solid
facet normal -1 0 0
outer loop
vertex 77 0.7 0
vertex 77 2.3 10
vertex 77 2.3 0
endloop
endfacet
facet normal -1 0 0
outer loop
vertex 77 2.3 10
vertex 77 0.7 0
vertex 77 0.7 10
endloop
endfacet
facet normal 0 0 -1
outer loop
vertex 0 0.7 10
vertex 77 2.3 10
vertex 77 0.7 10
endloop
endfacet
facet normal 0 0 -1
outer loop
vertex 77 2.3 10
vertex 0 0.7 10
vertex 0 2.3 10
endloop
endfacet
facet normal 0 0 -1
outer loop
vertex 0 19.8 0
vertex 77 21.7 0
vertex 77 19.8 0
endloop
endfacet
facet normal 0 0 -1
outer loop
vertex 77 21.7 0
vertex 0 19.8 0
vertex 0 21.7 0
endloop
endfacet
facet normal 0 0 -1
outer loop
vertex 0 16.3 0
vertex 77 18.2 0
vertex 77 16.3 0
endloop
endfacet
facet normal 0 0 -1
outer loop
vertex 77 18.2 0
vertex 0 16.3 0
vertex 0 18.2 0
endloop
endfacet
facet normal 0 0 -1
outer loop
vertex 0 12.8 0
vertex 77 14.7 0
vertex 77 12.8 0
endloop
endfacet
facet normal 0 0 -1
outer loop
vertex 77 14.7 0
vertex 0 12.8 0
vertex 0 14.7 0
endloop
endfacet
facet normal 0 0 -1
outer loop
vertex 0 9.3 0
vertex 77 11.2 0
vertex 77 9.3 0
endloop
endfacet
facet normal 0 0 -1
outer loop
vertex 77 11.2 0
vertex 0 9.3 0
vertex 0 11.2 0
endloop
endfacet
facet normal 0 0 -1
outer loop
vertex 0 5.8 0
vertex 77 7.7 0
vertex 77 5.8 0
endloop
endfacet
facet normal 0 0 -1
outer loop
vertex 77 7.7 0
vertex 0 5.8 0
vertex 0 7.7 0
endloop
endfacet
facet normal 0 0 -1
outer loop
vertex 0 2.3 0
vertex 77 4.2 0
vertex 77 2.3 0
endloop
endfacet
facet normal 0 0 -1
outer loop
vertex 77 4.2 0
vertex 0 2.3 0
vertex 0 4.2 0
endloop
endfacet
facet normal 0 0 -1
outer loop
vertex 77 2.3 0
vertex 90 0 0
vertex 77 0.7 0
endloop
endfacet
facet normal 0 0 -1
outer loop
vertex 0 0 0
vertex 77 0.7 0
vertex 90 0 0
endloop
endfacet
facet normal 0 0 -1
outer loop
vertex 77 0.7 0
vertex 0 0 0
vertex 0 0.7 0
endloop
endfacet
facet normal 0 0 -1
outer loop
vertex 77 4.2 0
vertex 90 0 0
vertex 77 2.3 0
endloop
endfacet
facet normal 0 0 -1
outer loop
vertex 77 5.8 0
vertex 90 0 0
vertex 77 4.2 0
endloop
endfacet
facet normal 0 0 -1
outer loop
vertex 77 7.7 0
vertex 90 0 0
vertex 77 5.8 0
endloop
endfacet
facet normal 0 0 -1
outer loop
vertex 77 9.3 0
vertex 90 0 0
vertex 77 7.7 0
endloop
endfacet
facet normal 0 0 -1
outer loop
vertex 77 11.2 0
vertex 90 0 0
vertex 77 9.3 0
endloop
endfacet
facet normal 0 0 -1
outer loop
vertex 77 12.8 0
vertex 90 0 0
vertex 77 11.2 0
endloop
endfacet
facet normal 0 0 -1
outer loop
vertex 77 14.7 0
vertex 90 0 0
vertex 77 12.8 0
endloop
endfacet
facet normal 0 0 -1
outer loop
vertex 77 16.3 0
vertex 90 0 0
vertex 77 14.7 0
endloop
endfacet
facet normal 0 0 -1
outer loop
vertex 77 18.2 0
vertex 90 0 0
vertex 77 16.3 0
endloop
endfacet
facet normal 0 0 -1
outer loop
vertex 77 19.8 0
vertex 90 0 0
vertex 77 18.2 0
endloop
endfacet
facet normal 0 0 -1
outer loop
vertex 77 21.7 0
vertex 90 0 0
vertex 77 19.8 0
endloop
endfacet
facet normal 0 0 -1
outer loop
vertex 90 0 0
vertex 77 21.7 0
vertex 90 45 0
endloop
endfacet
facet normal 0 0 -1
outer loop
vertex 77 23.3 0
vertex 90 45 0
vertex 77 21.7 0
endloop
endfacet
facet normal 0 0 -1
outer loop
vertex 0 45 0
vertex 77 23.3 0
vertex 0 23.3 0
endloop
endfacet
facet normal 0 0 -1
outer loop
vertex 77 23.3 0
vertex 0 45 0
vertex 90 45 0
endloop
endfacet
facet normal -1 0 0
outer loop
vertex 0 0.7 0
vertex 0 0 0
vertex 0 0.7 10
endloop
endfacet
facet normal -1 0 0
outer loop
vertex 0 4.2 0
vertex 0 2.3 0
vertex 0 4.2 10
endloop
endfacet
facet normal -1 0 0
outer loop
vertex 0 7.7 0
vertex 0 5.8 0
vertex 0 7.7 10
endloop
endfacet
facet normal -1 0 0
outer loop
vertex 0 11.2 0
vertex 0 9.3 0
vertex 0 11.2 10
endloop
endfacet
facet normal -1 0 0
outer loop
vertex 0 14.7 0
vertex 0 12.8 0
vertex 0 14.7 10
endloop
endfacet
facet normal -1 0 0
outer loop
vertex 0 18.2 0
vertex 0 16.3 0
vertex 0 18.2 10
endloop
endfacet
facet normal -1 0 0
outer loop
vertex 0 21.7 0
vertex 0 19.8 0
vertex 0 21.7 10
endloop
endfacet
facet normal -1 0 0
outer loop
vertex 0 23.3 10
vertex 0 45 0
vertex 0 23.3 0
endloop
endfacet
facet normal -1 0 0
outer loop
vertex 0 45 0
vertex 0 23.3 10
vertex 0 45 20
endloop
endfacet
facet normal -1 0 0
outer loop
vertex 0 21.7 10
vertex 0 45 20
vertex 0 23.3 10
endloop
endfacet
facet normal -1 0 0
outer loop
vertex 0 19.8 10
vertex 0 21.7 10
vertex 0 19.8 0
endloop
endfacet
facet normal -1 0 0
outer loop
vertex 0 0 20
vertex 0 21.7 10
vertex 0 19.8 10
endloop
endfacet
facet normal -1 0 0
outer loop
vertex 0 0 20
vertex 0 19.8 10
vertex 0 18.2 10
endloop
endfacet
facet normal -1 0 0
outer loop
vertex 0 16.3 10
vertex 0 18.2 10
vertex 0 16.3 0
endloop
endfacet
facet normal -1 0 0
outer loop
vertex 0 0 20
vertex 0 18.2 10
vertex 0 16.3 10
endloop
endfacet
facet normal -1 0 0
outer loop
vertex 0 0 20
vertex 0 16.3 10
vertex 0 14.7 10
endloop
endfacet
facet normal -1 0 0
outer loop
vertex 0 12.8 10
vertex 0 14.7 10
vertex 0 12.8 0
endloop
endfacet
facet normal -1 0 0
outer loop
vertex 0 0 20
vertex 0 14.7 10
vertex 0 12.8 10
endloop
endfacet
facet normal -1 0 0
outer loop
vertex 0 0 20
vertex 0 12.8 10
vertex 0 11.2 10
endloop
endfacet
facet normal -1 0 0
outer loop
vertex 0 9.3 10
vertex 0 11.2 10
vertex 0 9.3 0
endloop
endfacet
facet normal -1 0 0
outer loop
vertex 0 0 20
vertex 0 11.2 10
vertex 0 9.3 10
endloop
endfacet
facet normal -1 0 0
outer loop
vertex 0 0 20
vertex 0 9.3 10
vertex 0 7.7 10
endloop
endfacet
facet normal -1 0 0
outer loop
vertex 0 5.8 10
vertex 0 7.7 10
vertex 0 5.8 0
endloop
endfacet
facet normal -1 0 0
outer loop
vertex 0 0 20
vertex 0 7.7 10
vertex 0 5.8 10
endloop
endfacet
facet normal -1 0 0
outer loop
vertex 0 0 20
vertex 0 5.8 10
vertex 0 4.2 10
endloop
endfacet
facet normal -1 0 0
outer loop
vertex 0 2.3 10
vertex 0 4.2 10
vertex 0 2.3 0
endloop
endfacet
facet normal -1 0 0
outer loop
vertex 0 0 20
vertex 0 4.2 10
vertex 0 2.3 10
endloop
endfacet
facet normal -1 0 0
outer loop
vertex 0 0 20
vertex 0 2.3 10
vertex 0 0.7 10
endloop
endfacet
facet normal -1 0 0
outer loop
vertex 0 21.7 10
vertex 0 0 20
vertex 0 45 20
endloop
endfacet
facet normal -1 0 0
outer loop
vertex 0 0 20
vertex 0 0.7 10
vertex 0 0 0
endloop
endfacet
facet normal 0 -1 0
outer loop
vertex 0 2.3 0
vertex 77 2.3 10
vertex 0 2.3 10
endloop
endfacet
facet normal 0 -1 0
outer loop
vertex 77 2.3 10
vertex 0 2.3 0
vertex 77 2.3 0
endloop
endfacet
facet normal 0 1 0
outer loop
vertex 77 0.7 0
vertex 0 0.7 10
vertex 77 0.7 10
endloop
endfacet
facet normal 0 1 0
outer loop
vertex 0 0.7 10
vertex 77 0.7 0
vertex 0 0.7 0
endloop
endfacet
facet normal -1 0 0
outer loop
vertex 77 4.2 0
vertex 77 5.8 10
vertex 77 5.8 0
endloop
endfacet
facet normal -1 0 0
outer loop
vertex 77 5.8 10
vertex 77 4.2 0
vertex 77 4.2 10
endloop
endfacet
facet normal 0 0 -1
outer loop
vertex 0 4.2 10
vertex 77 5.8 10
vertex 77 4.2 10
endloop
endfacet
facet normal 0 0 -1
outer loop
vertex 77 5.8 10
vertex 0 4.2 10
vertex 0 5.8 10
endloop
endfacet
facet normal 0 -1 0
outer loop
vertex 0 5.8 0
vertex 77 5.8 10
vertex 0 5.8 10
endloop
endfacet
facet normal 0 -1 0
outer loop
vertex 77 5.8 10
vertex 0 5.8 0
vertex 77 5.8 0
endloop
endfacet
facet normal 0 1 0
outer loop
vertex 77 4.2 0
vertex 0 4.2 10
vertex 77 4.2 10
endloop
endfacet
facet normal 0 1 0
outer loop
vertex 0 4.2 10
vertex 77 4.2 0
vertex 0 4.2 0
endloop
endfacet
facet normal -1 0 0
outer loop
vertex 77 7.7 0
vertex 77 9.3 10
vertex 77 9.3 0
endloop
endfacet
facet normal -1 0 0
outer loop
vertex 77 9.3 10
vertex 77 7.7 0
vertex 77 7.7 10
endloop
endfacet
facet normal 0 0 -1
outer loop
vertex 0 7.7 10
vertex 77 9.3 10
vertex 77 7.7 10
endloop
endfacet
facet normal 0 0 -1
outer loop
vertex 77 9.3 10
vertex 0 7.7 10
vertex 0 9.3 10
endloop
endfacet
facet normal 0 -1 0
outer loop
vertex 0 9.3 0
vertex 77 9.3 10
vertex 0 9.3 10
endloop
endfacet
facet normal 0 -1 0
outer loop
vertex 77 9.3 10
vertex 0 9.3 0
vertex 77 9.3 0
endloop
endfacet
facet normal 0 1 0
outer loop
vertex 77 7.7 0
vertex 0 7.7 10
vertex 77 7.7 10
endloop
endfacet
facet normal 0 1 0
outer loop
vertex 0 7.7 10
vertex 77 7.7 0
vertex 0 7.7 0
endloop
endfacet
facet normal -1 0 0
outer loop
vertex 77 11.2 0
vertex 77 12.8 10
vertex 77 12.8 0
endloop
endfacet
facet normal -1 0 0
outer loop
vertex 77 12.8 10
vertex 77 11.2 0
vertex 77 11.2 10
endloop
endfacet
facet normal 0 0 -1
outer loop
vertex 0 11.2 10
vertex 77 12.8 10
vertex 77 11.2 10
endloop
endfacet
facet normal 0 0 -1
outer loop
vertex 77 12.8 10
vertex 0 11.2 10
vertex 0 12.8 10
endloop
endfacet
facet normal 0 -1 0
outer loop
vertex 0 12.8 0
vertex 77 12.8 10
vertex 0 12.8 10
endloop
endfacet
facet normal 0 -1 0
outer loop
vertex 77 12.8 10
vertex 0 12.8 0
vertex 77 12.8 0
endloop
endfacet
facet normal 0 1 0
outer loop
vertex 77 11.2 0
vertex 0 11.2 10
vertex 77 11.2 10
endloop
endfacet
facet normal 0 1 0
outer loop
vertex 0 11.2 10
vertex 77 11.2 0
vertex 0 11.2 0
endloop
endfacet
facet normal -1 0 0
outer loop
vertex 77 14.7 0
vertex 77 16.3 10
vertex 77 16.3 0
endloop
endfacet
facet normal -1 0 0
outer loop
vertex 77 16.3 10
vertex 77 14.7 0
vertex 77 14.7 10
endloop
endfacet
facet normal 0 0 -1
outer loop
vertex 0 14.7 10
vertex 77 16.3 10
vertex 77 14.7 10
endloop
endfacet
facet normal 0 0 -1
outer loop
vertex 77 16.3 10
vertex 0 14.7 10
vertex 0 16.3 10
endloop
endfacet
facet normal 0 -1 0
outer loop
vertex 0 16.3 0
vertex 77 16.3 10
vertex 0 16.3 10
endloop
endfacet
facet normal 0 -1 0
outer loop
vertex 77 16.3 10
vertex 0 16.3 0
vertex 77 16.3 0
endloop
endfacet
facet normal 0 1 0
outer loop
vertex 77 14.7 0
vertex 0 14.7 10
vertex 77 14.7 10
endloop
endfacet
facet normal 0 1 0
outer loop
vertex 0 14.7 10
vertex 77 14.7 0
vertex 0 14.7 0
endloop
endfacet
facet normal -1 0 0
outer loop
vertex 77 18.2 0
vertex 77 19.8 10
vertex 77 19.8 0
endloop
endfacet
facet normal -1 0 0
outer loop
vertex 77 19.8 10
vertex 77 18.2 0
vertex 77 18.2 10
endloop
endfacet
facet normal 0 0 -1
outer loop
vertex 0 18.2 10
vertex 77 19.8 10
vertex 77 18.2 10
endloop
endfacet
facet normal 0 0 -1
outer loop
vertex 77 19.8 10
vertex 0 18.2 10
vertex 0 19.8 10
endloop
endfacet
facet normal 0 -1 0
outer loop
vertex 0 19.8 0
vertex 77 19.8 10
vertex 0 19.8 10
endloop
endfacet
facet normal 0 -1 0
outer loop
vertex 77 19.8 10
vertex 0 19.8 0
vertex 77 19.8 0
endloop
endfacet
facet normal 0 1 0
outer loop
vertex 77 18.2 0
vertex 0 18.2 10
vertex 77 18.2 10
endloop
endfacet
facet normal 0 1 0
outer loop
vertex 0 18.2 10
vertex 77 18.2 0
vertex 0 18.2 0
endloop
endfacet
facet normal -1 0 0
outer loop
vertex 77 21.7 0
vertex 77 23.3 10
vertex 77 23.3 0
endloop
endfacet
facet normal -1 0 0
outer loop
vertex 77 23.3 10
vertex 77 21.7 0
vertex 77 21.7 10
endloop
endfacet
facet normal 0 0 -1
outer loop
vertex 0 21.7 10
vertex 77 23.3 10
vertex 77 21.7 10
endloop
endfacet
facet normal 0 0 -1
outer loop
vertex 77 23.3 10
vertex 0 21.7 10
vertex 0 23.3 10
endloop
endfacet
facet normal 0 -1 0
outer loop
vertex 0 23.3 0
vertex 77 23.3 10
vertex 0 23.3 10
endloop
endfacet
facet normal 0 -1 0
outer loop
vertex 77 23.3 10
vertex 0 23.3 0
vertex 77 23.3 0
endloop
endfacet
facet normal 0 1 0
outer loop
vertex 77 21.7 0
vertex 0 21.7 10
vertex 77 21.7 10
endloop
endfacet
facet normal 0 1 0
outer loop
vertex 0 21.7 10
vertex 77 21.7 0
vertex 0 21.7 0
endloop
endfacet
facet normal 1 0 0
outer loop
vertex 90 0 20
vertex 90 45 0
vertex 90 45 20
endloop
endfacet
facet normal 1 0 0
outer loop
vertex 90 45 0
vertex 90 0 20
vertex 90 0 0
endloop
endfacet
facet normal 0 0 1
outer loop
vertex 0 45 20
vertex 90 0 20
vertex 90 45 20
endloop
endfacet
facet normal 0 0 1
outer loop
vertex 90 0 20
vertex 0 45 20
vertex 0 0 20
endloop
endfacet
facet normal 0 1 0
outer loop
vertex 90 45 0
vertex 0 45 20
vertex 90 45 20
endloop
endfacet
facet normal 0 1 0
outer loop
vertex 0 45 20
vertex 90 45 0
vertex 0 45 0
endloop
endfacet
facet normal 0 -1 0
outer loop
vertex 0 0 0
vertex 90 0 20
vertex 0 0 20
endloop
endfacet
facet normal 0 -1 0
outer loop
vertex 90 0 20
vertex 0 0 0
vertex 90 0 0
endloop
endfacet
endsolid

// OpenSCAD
// Drying rack for 10 microscope slides.
// Base: 90 x 45 x 20 mm.
// 10 slots: 77 x 1.6 x 10 mm, spaced 3.5 mm C-C in Y, centred on block.

$fn = 64;

// Base dimensions
L_base = 90;
W_base = 45;
H_base = 20;

// Slot dimensions
N_slots = 10;
slot_len = 77;
slot_w   = 1.6;
slot_deep = 10;

// Spacing: 3.5 mm centre-to-centre
slot_cc = 3.5;

// Calculate positions
// Total span of slots = (N_slots - 1) * slot_cc + slot_w
total_span = (N_slots - 1) * slot_cc + slot_w;
margin = (W_base - total_span) / 2;

// Generate Y positions for the 10 slots
// Positions are centred on the origin in Y
// y_pos[i] = margin + (i - (N_slots-1)/2) * slot_cc
slot_positions = [for (i = [0 : N_slots - 1]) margin + (i - (N_slots - 1) / 2) * slot_cc];

difference() {
    // Main block
    translate([0, 0, 0]) cube([L_base, W_base, H_base]);
    
    // Cut slots
    for (y = slot_positions) {
        translate([0, y, 0]) cube([slot_len, slot_w, slot_deep]);
    }
}
